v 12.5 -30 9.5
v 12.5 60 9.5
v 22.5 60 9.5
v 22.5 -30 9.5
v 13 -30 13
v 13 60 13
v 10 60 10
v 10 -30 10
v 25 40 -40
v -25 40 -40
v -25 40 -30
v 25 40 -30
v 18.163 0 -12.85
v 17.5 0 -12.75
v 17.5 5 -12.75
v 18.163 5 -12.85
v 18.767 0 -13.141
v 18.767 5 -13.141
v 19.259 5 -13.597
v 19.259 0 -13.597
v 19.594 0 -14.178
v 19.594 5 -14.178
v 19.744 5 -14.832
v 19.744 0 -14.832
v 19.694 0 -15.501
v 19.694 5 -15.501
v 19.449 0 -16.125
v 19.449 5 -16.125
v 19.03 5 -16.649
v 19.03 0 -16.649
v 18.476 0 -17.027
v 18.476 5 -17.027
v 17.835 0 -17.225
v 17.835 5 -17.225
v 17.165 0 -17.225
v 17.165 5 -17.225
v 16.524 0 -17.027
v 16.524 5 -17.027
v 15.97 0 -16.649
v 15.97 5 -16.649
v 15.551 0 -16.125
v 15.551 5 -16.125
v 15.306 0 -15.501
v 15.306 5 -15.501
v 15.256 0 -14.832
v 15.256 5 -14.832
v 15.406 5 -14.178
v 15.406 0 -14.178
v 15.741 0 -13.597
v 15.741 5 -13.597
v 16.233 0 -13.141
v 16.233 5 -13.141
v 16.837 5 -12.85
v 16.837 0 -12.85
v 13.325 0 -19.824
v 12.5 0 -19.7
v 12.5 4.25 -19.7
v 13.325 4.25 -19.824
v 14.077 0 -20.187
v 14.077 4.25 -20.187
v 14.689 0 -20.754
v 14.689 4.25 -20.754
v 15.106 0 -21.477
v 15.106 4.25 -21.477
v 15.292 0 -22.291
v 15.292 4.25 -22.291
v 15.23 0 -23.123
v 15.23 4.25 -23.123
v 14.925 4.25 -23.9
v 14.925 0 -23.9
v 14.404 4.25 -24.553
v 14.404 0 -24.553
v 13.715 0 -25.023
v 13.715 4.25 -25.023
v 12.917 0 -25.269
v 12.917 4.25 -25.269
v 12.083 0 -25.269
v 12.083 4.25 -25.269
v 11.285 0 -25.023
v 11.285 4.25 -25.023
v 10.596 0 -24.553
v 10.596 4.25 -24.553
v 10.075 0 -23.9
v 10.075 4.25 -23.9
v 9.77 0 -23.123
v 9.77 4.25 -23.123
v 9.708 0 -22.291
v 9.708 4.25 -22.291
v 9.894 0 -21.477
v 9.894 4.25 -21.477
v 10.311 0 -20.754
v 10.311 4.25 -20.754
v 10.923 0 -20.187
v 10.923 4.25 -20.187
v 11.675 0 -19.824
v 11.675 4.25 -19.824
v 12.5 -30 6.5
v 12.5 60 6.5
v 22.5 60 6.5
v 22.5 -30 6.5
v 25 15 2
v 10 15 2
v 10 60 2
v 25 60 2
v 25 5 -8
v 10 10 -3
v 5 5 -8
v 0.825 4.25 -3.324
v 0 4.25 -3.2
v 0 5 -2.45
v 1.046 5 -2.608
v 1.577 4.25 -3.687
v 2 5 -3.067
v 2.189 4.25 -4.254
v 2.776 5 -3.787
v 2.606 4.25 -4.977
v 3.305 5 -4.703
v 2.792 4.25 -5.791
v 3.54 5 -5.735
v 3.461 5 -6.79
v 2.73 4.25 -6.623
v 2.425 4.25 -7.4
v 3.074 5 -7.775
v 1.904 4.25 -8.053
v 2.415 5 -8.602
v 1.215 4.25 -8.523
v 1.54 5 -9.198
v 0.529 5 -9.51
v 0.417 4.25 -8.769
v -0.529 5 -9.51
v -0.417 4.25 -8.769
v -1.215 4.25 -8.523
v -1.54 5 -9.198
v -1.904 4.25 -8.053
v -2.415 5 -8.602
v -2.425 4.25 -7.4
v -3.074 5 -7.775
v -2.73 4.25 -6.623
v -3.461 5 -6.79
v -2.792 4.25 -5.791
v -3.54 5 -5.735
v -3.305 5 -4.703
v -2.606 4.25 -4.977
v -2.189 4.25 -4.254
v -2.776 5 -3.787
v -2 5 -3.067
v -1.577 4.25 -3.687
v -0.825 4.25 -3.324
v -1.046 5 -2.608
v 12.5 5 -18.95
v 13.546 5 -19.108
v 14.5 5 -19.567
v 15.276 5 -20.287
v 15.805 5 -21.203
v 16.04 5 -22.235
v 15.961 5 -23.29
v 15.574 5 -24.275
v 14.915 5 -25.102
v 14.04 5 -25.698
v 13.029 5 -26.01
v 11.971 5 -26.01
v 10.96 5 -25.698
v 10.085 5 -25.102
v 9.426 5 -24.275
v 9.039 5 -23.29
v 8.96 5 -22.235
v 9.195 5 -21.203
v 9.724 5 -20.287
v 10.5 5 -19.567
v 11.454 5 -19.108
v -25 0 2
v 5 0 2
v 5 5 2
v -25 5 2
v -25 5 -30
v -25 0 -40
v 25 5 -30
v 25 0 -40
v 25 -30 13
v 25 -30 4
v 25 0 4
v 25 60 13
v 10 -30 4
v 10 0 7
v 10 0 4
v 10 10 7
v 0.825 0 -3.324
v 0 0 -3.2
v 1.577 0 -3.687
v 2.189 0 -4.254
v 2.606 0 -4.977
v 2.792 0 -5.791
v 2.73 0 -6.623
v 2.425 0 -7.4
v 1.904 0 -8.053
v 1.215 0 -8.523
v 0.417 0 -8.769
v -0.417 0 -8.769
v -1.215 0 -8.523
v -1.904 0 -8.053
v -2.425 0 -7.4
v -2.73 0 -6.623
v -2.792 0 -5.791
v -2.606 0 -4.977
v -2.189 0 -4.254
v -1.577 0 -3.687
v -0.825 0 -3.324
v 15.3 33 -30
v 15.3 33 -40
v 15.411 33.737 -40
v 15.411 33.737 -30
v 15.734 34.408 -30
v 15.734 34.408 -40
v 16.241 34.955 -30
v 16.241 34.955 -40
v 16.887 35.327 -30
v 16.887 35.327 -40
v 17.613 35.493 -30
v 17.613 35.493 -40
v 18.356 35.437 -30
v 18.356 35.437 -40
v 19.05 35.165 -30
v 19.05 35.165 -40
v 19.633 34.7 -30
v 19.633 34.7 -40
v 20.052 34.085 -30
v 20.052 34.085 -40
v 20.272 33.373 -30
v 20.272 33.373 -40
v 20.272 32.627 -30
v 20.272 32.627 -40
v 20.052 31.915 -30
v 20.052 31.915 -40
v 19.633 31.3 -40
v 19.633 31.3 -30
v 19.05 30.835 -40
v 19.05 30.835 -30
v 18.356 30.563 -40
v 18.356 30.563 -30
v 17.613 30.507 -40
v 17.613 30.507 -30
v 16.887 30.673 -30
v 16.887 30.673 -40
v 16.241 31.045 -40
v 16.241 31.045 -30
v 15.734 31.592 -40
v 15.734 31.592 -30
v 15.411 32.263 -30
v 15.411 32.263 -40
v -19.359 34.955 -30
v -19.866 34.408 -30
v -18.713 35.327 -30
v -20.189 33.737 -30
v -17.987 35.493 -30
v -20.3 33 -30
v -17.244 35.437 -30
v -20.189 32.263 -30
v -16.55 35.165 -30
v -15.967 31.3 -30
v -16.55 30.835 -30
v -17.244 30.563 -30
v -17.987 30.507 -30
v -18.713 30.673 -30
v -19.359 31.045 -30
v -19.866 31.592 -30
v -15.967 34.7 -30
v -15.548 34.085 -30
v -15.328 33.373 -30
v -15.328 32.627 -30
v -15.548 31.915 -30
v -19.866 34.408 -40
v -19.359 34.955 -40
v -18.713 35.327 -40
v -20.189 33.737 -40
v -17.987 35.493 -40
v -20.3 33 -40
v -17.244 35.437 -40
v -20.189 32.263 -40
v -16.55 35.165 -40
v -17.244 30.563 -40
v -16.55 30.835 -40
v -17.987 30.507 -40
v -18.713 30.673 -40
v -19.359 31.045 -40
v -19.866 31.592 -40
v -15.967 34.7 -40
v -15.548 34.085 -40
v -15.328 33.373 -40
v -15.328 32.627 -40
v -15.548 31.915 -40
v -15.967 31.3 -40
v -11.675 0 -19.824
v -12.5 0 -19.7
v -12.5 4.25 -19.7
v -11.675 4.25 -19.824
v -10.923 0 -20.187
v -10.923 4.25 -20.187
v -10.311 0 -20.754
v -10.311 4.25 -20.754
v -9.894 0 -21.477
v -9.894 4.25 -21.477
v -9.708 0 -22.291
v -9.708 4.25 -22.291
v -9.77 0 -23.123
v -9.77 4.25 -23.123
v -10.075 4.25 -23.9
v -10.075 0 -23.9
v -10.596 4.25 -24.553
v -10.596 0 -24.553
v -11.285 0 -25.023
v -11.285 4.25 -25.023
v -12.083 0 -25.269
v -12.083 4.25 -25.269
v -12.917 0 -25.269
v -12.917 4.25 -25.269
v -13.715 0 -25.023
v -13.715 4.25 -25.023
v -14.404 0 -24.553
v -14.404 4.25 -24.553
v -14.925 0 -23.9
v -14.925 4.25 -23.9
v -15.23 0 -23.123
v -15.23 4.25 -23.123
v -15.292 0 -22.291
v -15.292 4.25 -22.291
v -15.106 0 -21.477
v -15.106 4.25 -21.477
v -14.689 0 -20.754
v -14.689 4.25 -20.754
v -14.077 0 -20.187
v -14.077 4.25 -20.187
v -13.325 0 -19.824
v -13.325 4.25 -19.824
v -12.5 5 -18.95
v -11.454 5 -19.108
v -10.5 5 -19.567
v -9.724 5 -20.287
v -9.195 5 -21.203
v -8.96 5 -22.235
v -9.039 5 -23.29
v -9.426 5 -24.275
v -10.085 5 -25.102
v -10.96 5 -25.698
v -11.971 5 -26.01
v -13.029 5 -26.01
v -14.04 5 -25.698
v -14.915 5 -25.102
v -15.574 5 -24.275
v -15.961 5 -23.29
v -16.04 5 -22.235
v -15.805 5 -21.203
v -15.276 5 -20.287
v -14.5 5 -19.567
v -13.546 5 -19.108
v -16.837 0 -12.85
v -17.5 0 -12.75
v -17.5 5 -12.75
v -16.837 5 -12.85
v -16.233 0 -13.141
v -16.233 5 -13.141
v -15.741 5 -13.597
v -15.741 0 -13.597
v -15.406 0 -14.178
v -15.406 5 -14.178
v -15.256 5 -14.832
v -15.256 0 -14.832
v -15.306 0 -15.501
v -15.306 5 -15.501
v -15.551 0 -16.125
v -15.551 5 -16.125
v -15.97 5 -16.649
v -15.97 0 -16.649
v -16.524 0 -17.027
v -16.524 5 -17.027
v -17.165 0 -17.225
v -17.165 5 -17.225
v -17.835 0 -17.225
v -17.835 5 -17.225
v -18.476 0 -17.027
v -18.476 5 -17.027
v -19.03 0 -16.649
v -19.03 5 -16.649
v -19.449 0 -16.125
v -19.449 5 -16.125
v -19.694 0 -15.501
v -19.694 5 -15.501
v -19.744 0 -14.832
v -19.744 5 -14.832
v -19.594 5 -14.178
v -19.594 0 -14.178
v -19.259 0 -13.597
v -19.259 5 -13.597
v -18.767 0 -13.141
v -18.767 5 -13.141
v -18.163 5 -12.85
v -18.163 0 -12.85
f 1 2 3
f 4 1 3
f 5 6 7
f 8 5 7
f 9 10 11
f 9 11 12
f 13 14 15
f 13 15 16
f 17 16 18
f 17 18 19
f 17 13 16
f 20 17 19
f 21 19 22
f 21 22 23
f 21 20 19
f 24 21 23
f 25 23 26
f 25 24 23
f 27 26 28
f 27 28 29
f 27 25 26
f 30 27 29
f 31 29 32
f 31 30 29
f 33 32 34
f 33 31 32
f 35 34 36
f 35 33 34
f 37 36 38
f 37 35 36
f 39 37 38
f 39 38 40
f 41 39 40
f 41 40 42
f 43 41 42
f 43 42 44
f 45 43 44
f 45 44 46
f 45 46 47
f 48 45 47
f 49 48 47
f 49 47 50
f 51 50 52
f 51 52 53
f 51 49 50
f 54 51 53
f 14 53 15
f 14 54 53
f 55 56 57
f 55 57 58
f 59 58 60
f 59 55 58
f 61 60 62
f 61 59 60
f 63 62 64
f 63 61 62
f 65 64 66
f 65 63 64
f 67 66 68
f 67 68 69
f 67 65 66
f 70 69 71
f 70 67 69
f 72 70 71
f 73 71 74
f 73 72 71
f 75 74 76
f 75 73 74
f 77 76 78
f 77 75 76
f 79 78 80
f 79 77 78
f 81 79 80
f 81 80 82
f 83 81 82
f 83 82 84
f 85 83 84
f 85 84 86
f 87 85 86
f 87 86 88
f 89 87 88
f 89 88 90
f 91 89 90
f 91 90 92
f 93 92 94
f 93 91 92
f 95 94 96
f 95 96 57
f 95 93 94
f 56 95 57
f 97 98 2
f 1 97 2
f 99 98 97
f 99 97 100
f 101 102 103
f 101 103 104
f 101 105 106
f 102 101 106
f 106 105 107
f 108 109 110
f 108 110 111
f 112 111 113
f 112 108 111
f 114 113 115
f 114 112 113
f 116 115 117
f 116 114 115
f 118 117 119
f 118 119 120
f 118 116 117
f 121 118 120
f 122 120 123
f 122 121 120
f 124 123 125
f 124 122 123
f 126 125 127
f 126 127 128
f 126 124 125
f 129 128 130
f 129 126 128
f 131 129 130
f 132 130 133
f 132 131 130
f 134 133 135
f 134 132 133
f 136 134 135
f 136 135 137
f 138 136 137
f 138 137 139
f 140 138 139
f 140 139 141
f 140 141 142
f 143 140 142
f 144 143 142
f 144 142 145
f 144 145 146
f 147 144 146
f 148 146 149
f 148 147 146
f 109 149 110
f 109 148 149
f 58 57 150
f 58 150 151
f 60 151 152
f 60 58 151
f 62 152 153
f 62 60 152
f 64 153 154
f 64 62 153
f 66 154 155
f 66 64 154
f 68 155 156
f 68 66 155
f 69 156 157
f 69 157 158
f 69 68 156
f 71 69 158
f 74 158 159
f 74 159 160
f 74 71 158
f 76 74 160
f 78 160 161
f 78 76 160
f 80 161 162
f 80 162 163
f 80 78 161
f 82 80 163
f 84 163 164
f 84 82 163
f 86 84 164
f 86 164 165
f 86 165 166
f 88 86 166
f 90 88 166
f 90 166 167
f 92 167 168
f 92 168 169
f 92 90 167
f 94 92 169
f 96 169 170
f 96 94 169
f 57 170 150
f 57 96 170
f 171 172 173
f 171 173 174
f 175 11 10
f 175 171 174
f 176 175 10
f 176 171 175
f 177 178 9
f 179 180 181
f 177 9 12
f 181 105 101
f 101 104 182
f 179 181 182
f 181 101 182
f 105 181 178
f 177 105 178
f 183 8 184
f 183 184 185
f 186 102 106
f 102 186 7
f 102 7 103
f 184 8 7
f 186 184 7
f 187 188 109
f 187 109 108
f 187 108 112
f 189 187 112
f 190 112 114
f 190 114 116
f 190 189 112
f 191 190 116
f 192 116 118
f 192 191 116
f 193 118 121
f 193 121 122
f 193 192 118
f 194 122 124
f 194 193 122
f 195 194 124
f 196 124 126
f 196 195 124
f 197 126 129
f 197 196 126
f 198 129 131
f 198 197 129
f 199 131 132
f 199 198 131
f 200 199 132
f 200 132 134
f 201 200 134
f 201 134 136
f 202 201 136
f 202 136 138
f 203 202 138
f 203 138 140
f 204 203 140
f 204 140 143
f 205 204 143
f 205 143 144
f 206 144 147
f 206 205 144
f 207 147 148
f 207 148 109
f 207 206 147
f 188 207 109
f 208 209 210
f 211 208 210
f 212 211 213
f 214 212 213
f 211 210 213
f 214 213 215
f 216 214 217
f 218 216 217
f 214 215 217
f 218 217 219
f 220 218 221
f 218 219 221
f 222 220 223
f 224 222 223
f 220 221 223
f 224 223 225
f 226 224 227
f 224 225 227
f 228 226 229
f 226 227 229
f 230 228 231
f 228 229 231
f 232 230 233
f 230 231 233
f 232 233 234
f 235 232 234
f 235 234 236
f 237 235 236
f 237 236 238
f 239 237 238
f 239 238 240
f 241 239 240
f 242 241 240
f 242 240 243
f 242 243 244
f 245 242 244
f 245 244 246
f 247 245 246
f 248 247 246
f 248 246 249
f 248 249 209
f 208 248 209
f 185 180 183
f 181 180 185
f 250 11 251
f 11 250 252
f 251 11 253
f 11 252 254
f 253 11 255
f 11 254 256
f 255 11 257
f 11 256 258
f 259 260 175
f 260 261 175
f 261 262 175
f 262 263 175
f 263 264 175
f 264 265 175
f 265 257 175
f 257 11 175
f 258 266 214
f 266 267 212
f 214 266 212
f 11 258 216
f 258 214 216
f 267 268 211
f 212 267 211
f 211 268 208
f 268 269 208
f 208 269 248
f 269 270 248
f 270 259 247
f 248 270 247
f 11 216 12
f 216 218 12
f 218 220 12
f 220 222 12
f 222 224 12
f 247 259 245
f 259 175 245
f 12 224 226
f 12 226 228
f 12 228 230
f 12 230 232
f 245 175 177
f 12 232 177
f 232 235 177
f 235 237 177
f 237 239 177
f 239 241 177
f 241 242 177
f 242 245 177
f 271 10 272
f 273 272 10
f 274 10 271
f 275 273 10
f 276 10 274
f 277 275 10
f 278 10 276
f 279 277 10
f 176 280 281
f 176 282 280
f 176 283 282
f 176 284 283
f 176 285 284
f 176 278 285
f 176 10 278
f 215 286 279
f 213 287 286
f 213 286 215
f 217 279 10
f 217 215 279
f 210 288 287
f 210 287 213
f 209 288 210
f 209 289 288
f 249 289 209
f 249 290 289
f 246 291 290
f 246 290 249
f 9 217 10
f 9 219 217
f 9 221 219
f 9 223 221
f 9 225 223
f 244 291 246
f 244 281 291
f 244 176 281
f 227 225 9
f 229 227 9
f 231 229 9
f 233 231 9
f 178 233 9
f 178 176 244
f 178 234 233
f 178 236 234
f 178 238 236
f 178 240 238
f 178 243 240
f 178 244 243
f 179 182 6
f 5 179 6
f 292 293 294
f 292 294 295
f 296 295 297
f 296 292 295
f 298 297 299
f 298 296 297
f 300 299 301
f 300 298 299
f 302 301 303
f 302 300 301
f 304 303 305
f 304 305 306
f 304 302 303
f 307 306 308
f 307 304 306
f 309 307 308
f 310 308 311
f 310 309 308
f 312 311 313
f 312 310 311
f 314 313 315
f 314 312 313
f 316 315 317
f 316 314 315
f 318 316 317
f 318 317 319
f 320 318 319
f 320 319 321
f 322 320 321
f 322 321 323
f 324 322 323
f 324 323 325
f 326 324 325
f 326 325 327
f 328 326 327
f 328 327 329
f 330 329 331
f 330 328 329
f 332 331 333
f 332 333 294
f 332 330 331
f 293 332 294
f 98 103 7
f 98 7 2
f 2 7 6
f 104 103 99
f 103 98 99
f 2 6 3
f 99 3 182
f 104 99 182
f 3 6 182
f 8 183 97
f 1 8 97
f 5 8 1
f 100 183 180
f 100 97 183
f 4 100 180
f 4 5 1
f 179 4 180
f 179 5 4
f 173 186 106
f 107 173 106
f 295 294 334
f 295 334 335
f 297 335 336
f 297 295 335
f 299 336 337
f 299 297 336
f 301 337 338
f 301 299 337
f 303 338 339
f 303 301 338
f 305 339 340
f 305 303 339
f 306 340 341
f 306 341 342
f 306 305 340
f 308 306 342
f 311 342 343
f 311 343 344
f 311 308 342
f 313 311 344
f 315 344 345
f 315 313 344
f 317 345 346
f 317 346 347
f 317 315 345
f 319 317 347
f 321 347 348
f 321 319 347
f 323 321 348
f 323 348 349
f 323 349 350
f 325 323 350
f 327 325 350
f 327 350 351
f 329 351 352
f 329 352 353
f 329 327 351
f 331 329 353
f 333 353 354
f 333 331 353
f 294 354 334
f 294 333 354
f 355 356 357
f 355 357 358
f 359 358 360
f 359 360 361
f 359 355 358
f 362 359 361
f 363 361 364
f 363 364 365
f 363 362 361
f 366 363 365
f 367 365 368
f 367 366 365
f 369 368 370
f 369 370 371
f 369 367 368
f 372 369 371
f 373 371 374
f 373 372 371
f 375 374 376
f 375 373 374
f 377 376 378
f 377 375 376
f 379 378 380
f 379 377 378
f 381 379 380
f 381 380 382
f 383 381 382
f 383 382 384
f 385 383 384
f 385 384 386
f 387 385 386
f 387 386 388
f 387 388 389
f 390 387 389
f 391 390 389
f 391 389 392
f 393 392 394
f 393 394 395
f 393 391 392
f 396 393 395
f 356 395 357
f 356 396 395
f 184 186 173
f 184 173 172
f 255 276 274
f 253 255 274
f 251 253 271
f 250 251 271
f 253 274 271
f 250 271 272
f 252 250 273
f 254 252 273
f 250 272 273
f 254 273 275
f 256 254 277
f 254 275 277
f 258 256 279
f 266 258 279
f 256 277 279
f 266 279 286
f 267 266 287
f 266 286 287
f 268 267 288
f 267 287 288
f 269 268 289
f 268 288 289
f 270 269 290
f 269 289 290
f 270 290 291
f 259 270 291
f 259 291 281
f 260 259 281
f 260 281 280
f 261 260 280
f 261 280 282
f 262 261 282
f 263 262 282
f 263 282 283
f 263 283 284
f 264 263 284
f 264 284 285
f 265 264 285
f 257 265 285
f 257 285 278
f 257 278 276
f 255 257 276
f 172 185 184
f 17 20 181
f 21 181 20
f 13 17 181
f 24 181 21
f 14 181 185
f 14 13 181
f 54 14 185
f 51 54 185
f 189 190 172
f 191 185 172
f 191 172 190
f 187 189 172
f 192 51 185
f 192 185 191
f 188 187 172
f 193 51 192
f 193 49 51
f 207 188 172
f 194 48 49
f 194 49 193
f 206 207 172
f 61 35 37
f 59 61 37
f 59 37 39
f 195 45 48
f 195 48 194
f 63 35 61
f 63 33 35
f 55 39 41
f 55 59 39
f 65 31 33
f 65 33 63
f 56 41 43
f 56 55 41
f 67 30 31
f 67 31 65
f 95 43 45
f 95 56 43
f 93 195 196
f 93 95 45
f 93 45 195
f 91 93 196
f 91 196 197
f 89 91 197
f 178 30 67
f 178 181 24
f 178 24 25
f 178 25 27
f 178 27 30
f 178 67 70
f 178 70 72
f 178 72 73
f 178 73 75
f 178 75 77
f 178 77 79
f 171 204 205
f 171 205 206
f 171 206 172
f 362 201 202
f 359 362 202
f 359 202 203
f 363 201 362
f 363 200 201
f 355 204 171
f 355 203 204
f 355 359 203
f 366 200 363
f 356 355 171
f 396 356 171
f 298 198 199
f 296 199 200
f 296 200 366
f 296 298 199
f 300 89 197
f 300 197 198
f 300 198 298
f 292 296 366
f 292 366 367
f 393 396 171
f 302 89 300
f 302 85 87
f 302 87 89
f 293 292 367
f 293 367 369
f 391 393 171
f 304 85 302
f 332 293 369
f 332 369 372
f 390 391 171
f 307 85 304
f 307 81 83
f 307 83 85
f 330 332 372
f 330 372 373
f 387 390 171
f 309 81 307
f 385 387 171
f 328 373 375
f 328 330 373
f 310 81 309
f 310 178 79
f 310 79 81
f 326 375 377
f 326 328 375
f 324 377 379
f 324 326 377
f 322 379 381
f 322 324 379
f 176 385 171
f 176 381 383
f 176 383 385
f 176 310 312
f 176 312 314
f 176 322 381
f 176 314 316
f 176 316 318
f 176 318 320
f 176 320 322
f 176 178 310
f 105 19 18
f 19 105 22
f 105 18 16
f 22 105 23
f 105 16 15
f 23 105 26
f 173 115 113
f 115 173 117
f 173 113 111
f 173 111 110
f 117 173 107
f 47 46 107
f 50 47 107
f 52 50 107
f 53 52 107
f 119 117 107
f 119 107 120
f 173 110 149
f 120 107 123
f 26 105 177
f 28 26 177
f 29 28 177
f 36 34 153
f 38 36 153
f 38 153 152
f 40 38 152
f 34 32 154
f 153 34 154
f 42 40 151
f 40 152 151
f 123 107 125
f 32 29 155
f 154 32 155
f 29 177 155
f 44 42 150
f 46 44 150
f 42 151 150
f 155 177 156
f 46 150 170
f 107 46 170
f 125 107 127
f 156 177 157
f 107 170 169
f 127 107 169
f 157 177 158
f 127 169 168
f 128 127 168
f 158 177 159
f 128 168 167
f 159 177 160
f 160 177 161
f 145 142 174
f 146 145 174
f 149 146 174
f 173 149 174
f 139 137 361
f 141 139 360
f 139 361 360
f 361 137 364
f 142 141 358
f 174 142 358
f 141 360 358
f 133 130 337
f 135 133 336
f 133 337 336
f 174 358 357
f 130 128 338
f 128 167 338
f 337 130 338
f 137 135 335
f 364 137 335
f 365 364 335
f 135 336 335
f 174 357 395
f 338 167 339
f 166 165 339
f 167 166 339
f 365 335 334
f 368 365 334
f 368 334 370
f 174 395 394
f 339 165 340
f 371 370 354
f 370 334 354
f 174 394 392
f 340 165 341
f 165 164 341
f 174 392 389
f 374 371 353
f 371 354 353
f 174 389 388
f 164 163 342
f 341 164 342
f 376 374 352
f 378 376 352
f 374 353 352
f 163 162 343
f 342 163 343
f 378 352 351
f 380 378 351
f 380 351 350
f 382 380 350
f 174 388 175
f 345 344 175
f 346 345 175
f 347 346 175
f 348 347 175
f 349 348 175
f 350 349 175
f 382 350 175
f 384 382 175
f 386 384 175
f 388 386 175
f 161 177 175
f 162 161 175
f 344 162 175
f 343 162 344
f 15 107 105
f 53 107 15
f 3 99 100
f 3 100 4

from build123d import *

# Parameters (mm, degrees)
SKETCH1_R                = 2.8
SKETCH1_R_2              = 2.25
BOSS_EXTRUDE1_DEPTH      = 5
SKETCH3_W                = 50
SKETCH3_H                = 10
BOSS_EXTRUDE3_DEPTH      = 35
SKETCH4_R                = 2.5
CUT_EXTRUDE1_DEPTH       = 64.158530699
CHAMFER1_SIZE            = 0.75
BOSS_EXTRUDE4_DEPTH      = 30
BOSS_EXTRUDE4_DEPTH_BACK = 60
SKETCH5_W                = 10
SKETCH5_H                = 3
CHAMFER2_SIZE            = 10
CHAMFER3_SIZE            = 5
SKETCH7_W                = 2
SKETCH7_H                = 30
CUT_EXTRUDE2_DEPTH       = 88.749643874


with BuildPart() as part:
    # Sketch1 → Boss-Extrude1 (new body)
    with BuildSketch(Plane(origin=(0, 0, 0), x_dir=(1, 0, 0), z_dir=(0, 1, 0))):
        Polygon((-25, 0), (-25, 40), (25, 40), (25, 0), (25, -2), (-25, -2), align=None)
        with Locations(Location((-12.5, 22.5, 0), (0, 0, 270))):
            Circle(SKETCH1_R, mode=Mode.SUBTRACT)
        with Locations(Location((12.5, 22.5, 0), (0, 0, 270))):
            Circle(SKETCH1_R, mode=Mode.SUBTRACT)
        with Locations(Location((-17.5, 15, 0), (0, 0, 270))):
            Circle(SKETCH1_R_2, mode=Mode.SUBTRACT)
        with Locations(Location((17.5, 15, 0), (0, 0, 270))):
            Circle(SKETCH1_R_2, mode=Mode.SUBTRACT)
        with Locations(Location((0, 6, 0), (0, 0, 270))):
            Circle(SKETCH1_R, mode=Mode.SUBTRACT)
    extrude(amount=BOSS_EXTRUDE1_DEPTH)

    # Sketch3 → Boss-Extrude3 (add)
    with BuildSketch(Plane(origin=(0, 5, 0), x_dir=(1, 0, 0), z_dir=(0, 1, 0))):
        with Locations((0, 35)):
            Rectangle(SKETCH3_W, SKETCH3_H)
    extrude(amount=BOSS_EXTRUDE3_DEPTH)

    # Sketch4 → Cut-Extrude1 (cut, through all)
    with BuildSketch(Plane(origin=(0, 0, -40), x_dir=(-1, 0, 0), z_dir=(0, 0, -1))):
        with Locations((-17.8, 33)):
            Circle(SKETCH4_R)
        with Locations((17.8, 33)):
            Circle(SKETCH4_R)
    extrude(amount=-CUT_EXTRUDE1_DEPTH, mode=Mode.SUBTRACT)

    # Chamfer1
    chamfer1_edges = [part.edges().sort_by_distance(p)[0] for p in [
        (-12.5, 5, -25.3),
        (12.5, 5, -25.3),
        (0, 5, -8.8),
    ]]
    chamfer(chamfer1_edges, length=CHAMFER1_SIZE)

    # Sketch5 → Boss-Extrude4 (add, two sides: drawn at the far end of the back side and taken through both)
    with BuildSketch(Plane.XZ.offset(-BOSS_EXTRUDE4_DEPTH_BACK)):
        Polygon((13, 13), (10, 10), (10, 2), (25, 2), (25, 13), align=None)
        with Locations((17.5, 8)):
            Rectangle(SKETCH5_W, SKETCH5_H, mode=Mode.SUBTRACT)
    extrude(amount=BOSS_EXTRUDE4_DEPTH + BOSS_EXTRUDE4_DEPTH_BACK)

    # Chamfer2
    chamfer2_edges = [part.edges().sort_by_distance(p)[0] for p in [
        (17.5, 5, 2),
    ]]
    chamfer(chamfer2_edges, length=CHAMFER2_SIZE)

    # Chamfer3
    chamfer3_edges = [part.edges().sort_by_distance(p)[0] for p in [
        (10, 2.5, 2),
        (10, 5, -3),
    ]]
    chamfer(chamfer3_edges, length=CHAMFER3_SIZE)

    # Sketch7 → Cut-Extrude2 (cut, through all)
    with BuildSketch(Plane(origin=(25, 0, 0), x_dir=(0, 0, -1), z_dir=(1, 0, 0))):
        with Locations((-3, -15)):
            Rectangle(SKETCH7_W, SKETCH7_H)
    extrude(amount=-CUT_EXTRUDE2_DEPTH, mode=Mode.SUBTRACT)


solid = part.part
